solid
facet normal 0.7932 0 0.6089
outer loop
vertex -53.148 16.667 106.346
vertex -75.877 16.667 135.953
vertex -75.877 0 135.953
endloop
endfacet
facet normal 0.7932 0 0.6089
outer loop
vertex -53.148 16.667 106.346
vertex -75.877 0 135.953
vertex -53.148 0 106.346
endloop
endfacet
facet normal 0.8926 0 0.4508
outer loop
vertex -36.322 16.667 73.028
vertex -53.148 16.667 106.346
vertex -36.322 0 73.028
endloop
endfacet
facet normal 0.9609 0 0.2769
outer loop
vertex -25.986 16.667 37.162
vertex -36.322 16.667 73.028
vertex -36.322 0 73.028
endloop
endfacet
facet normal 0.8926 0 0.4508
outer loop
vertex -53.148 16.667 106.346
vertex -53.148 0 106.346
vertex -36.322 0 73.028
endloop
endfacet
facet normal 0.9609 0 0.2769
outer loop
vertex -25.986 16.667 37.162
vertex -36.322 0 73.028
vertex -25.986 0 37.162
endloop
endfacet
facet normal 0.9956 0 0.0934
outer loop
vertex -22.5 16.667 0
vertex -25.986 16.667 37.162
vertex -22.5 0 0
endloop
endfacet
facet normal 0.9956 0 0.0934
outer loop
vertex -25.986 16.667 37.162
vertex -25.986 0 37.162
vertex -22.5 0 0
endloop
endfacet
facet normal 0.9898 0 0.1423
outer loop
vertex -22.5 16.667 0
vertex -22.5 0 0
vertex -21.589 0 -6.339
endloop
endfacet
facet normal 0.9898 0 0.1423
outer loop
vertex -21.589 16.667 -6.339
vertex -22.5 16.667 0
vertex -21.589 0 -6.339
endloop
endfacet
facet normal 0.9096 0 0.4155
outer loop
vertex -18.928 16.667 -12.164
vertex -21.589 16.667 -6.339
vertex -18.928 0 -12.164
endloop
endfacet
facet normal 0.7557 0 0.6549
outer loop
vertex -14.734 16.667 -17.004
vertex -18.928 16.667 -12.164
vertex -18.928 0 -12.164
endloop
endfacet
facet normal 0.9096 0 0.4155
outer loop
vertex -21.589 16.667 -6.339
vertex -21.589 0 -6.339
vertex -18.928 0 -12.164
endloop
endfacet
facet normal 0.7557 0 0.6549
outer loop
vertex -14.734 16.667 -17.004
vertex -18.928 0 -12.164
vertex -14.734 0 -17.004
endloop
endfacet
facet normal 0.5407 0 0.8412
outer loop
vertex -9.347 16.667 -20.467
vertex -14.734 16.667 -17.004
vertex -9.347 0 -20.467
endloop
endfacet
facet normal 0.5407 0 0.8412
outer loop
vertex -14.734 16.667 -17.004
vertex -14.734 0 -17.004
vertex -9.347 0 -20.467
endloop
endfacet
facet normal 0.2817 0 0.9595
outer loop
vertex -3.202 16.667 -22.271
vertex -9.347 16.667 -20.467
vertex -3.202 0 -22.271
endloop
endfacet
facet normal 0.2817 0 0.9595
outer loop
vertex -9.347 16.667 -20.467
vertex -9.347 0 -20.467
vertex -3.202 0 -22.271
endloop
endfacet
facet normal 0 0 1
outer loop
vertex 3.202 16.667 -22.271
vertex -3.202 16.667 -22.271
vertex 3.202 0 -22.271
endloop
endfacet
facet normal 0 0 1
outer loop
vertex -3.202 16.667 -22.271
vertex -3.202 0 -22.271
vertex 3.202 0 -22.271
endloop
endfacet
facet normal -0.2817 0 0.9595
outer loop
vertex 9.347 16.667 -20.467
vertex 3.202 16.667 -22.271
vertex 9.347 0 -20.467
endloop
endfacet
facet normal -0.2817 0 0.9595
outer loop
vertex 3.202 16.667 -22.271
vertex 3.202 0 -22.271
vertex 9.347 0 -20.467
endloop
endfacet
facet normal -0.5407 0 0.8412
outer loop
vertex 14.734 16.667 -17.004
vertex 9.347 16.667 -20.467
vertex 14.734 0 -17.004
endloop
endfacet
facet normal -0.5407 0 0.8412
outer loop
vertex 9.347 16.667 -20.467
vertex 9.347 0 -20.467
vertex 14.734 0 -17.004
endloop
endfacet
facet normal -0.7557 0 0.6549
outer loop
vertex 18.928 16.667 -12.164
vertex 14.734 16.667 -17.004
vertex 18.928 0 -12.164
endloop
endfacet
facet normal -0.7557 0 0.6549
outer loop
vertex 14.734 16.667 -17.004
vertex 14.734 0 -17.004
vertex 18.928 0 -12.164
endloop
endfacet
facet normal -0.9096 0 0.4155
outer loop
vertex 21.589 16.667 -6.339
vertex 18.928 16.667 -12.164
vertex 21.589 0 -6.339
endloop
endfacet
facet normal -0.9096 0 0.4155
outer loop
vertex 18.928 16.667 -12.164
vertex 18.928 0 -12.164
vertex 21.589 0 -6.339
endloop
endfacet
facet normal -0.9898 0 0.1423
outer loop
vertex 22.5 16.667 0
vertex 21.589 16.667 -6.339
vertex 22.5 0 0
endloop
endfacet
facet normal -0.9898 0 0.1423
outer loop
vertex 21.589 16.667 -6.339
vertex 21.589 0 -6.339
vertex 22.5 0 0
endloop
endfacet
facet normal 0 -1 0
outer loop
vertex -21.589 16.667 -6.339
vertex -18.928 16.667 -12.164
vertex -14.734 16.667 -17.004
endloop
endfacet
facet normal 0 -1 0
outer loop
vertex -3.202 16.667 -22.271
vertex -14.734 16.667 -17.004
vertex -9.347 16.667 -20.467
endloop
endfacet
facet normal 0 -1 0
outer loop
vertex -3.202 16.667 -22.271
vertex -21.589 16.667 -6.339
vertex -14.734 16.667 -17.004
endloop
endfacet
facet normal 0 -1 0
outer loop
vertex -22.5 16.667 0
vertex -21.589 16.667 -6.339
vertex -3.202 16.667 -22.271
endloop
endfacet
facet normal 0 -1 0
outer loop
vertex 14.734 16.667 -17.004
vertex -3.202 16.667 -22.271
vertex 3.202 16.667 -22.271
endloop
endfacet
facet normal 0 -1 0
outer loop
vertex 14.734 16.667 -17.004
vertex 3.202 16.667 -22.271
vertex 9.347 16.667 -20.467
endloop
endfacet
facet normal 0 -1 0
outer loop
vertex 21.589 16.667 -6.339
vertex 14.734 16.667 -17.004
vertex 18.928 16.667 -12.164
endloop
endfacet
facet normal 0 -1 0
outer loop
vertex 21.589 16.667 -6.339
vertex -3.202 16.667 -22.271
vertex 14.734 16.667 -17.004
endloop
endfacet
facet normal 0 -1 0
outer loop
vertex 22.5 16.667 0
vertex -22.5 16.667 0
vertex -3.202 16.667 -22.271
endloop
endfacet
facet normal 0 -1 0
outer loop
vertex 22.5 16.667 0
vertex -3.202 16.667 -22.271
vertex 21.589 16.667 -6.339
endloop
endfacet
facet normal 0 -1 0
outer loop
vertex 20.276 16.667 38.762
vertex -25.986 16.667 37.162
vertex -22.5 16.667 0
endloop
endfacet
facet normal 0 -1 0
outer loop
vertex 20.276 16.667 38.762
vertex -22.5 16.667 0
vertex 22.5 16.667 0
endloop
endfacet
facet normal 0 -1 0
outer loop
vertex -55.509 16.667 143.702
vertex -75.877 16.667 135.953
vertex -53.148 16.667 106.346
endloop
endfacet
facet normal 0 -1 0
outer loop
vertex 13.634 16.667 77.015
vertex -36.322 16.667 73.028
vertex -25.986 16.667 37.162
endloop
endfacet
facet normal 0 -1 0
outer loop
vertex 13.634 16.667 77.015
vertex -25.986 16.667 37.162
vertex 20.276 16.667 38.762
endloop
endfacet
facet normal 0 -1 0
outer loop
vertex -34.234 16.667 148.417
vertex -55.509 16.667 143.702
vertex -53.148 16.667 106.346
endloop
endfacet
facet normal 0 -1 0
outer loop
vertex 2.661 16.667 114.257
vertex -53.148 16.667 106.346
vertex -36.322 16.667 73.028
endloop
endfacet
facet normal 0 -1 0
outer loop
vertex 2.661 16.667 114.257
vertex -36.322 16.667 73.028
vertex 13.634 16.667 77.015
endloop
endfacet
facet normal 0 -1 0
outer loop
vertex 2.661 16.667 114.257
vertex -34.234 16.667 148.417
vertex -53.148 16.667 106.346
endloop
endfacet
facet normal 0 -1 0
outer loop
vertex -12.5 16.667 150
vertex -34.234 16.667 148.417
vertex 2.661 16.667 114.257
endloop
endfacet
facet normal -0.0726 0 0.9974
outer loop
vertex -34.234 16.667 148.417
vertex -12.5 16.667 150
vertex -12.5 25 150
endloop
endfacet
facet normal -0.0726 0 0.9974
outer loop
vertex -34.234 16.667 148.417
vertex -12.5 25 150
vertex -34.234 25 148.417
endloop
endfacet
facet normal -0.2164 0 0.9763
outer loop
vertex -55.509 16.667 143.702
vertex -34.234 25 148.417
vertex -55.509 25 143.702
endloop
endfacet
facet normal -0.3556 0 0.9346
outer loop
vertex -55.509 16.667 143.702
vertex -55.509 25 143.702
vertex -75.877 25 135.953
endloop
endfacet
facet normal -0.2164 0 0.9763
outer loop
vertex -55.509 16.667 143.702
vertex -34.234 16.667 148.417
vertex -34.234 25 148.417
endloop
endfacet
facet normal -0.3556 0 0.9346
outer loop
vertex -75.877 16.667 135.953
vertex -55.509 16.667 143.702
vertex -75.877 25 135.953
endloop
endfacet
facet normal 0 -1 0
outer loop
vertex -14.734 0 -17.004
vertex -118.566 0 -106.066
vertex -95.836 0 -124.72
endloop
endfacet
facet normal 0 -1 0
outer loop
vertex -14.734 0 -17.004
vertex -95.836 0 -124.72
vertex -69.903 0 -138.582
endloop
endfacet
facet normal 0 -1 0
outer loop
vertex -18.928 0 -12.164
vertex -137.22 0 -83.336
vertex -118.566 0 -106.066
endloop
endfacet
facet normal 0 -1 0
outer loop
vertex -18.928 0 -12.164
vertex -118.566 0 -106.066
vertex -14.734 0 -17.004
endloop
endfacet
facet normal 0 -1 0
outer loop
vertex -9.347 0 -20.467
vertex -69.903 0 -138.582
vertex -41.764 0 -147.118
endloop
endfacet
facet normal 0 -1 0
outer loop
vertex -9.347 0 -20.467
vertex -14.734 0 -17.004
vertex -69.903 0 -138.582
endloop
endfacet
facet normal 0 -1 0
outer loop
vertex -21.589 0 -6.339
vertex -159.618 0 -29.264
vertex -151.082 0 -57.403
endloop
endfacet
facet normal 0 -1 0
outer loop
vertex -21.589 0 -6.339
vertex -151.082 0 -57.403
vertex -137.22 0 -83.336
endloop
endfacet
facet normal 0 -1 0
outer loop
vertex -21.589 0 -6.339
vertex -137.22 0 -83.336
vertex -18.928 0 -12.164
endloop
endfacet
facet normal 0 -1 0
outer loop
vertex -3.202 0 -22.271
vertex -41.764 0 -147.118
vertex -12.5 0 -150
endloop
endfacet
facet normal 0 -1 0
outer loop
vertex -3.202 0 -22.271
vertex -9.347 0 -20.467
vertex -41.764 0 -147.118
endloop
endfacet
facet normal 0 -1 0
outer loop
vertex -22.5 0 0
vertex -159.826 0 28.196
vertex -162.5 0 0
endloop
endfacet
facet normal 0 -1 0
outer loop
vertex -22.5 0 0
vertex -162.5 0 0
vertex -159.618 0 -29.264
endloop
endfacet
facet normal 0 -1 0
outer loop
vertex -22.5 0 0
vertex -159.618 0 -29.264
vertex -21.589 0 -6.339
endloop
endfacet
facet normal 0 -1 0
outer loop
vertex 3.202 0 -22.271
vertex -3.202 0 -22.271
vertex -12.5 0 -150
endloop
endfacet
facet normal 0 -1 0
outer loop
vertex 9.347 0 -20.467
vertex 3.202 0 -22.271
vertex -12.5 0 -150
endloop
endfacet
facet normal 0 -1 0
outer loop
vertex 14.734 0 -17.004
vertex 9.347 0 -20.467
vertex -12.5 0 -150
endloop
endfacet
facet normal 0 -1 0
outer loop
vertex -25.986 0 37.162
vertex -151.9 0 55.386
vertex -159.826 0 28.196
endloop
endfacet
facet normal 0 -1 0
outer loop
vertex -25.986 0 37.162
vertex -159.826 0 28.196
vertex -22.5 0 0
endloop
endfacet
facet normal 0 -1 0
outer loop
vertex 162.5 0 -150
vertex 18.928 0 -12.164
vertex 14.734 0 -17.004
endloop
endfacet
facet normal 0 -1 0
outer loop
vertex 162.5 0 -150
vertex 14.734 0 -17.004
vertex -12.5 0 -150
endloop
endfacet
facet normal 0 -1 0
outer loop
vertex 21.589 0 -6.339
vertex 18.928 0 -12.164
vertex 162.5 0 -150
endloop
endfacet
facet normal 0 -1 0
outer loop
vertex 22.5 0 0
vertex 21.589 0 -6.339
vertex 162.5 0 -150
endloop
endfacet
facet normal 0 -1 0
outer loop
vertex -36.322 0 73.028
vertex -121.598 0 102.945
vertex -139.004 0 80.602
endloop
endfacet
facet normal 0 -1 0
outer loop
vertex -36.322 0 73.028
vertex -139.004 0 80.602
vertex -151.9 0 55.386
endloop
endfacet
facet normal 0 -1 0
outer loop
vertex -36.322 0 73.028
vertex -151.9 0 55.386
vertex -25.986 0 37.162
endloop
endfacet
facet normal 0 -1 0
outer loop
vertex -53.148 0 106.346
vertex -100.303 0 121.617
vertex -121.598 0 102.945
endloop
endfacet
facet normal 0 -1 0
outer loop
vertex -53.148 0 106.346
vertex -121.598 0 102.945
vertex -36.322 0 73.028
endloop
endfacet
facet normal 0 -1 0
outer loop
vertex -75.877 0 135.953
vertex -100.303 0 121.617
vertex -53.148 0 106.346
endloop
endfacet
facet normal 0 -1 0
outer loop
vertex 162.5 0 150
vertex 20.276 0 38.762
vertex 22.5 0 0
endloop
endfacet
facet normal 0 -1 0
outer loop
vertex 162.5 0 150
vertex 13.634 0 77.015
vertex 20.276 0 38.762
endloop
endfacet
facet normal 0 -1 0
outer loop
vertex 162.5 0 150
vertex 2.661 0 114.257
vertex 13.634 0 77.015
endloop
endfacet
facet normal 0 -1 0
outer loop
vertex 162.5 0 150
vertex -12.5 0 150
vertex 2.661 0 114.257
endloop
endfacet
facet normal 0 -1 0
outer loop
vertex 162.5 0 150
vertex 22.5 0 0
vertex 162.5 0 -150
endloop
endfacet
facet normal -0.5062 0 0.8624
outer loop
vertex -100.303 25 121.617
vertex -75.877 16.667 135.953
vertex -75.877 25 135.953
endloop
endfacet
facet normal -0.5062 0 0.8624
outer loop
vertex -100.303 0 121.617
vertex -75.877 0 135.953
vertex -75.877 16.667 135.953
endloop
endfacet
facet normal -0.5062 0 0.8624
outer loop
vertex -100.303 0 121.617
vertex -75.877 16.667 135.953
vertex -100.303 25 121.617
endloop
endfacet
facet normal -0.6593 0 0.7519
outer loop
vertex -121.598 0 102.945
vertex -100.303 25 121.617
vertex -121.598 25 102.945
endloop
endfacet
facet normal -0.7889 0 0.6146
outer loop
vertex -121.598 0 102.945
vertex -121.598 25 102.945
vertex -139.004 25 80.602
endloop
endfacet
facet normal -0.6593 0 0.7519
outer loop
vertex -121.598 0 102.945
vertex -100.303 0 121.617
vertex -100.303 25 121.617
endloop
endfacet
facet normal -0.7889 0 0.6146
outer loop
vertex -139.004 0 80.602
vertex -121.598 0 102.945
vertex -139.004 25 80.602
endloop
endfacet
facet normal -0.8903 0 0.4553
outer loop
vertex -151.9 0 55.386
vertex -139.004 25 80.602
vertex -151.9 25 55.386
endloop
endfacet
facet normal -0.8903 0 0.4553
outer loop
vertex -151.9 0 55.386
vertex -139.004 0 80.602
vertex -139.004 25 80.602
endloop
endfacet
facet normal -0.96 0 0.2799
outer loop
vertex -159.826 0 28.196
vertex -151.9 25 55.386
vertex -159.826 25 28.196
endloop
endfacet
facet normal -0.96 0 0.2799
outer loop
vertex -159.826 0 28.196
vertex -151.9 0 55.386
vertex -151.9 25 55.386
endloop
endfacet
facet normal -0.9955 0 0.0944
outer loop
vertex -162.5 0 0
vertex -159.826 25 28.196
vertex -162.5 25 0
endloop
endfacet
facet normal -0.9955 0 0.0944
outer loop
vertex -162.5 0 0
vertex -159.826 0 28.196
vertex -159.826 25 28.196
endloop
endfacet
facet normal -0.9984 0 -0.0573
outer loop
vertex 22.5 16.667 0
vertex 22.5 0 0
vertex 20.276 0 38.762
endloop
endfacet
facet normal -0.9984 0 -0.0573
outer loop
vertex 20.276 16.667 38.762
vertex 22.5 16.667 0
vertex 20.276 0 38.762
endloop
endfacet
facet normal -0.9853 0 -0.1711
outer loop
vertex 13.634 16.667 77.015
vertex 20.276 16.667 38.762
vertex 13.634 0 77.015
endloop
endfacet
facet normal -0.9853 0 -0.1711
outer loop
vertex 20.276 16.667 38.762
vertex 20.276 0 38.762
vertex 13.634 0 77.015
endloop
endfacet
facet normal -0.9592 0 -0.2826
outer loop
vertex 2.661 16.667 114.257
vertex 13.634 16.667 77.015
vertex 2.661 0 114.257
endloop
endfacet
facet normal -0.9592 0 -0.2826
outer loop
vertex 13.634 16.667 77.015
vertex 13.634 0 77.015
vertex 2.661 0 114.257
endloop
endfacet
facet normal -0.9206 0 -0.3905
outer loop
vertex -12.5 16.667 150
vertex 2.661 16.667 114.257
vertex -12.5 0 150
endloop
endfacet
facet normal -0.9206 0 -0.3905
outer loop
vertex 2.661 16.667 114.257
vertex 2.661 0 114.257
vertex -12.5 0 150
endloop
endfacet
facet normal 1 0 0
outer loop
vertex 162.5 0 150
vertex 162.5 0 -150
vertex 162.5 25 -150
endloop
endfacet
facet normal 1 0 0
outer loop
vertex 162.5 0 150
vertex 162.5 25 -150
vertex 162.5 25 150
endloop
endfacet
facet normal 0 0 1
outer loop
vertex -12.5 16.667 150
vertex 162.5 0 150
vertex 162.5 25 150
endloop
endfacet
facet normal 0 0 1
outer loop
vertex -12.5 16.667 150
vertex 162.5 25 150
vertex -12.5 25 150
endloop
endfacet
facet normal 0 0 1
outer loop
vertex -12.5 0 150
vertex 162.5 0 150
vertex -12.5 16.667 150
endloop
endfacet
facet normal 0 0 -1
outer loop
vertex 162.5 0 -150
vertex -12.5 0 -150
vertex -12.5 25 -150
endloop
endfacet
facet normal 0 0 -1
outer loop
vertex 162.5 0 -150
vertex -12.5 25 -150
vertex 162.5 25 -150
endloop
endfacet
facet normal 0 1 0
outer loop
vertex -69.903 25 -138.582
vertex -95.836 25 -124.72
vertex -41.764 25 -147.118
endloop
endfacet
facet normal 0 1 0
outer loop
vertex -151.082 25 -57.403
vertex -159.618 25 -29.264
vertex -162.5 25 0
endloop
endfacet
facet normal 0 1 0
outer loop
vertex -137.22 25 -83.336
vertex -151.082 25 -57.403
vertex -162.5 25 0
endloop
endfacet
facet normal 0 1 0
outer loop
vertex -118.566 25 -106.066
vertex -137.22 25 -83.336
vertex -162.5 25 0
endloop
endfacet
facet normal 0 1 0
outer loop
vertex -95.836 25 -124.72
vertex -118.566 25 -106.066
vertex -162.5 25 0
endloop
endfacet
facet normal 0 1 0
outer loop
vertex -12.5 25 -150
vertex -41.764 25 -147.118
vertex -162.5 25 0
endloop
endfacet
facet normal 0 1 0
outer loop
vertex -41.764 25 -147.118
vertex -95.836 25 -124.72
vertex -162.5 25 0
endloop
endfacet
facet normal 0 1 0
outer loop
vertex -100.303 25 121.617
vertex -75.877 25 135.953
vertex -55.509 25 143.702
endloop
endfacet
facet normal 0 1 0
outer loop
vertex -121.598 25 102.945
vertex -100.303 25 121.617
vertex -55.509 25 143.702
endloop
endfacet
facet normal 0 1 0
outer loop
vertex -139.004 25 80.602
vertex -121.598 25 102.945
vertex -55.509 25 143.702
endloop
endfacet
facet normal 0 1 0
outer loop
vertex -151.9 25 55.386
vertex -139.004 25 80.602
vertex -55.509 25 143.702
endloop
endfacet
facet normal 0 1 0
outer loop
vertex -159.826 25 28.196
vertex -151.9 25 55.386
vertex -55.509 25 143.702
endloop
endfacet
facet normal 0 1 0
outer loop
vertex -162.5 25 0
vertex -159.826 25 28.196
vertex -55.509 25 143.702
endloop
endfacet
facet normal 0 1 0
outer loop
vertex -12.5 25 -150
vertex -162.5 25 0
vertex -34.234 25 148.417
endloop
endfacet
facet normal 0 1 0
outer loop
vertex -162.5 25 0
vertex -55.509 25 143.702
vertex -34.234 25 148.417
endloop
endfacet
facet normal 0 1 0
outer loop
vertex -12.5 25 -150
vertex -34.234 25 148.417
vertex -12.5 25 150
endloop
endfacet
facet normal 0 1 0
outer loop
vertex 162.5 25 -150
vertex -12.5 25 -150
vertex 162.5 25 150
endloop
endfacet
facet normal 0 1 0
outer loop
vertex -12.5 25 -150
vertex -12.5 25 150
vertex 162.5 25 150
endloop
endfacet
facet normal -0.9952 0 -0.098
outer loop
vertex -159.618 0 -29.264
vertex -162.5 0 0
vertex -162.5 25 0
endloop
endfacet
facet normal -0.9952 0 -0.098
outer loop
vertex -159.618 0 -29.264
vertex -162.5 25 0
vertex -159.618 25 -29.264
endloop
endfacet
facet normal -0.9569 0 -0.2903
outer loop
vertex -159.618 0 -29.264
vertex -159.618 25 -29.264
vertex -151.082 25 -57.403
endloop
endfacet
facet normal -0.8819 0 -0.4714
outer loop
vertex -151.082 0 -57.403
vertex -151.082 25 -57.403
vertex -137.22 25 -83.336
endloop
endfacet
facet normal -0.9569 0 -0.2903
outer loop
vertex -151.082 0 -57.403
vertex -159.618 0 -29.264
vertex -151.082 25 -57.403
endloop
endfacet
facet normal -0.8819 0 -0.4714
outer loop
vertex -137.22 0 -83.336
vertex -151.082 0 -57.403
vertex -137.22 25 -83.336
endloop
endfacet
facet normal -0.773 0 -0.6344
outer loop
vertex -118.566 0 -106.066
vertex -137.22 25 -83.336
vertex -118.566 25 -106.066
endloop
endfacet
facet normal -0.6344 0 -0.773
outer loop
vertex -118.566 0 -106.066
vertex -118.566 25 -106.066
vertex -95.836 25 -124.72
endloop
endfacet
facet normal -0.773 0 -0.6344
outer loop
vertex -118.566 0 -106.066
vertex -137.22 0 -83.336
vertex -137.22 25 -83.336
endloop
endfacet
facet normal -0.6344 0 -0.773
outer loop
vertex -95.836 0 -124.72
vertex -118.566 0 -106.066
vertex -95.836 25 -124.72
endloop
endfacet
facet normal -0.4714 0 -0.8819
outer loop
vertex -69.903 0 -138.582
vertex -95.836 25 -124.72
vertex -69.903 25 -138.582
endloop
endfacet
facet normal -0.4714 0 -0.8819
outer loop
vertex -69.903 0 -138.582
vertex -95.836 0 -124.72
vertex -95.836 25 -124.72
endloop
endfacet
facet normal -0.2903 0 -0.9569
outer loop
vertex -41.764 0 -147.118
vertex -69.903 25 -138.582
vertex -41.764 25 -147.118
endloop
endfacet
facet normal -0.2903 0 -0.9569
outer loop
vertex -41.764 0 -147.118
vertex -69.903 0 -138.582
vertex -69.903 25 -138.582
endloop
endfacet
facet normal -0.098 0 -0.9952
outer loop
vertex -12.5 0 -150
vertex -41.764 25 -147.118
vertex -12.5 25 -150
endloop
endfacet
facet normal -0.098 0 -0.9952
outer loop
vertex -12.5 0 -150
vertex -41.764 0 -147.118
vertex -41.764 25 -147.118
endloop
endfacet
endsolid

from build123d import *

# Parameters (mm, degrees)
F3_DEPTH = 25
F4_DEPTH = 16.6666666667
F5_W     = 25
F5_H     = 300
F6_DEPTH = 400


with BuildPart() as f3:
    # F2 (on Front) → F3 (new body)
    with BuildSketch(Plane.XZ):
        with BuildLine():
            Line((162.5, 150), (-12.5, 150))
            ThreePointArc((-12.5, 150), (13.6340385875, 77.0146090037), (22.5, 0))
            ThreePointArc((22.5, 0), (0, -22.5), (-22.5, 0))
            ThreePointArc((-22.5, 0), (-36.3223137223, 73.0281778836), (-75.877047, 135.9534843745))
            ThreePointArc((-75.877047, 135.9534843745), (-139.0040652509, 80.6022423696), (-162.5, 0))
            ThreePointArc((-162.5, 0), (-118.566017178, -106.066017178), (-12.5, -150))
            Line((-12.5, -150), (162.5, -150))
            Line((162.5, -150), (162.5, 150))
        make_face()
        with BuildLine():
            ThreePointArc((22.5, 0), (13.6340385875, 77.0146090037), (-12.5, 150))
            ThreePointArc((-12.5, 150), (-44.9574902282, 146.4462745449), (-75.877047, 135.9534843745))
            ThreePointArc((-75.877047, 135.9534843745), (-36.3223137223, 73.0281778836), (-22.5, 0))
            ThreePointArc((-22.5, 0), (0, -22.5), (22.5, 0))
        make_face()
    extrude(amount=-F3_DEPTH)

    # F2 (on Front) → F4 (cut)
    with BuildSketch(Plane.XZ):
        with BuildLine():
            ThreePointArc((22.5, 0), (13.6340385875, 77.0146090037), (-12.5, 150))
            ThreePointArc((-12.5, 150), (-44.9574902282, 146.4462745449), (-75.877047, 135.9534843745))
            ThreePointArc((-75.877047, 135.9534843745), (-36.3223137223, 73.0281778836), (-22.5, 0))
            ThreePointArc((-22.5, 0), (0, -22.5), (22.5, 0))
        make_face()
    extrude(amount=-F4_DEPTH, mode=Mode.SUBTRACT)


with BuildPart() as f6:
    # F5 (on face) → F6 (new body)
    with BuildSketch(Plane(origin=(0, 25, 0), x_dir=(-1, 0, 0), z_dir=(0, 1, 0))):
        with Locations((-150, 0)):
            Rectangle(F5_W, F5_H)
    extrude(amount=-F6_DEPTH)


with BuildPart() as f9_1:
    # F9: instance of F3
    add(f3.part.mirror(Plane(origin=(150, -175, 0), x_dir=(-1, 0, 0), z_dir=(0, -1, 0))))


with BuildPart() as f10_1:
    # F10: copy of F3
    add(f3.part)


solid = f3.part
